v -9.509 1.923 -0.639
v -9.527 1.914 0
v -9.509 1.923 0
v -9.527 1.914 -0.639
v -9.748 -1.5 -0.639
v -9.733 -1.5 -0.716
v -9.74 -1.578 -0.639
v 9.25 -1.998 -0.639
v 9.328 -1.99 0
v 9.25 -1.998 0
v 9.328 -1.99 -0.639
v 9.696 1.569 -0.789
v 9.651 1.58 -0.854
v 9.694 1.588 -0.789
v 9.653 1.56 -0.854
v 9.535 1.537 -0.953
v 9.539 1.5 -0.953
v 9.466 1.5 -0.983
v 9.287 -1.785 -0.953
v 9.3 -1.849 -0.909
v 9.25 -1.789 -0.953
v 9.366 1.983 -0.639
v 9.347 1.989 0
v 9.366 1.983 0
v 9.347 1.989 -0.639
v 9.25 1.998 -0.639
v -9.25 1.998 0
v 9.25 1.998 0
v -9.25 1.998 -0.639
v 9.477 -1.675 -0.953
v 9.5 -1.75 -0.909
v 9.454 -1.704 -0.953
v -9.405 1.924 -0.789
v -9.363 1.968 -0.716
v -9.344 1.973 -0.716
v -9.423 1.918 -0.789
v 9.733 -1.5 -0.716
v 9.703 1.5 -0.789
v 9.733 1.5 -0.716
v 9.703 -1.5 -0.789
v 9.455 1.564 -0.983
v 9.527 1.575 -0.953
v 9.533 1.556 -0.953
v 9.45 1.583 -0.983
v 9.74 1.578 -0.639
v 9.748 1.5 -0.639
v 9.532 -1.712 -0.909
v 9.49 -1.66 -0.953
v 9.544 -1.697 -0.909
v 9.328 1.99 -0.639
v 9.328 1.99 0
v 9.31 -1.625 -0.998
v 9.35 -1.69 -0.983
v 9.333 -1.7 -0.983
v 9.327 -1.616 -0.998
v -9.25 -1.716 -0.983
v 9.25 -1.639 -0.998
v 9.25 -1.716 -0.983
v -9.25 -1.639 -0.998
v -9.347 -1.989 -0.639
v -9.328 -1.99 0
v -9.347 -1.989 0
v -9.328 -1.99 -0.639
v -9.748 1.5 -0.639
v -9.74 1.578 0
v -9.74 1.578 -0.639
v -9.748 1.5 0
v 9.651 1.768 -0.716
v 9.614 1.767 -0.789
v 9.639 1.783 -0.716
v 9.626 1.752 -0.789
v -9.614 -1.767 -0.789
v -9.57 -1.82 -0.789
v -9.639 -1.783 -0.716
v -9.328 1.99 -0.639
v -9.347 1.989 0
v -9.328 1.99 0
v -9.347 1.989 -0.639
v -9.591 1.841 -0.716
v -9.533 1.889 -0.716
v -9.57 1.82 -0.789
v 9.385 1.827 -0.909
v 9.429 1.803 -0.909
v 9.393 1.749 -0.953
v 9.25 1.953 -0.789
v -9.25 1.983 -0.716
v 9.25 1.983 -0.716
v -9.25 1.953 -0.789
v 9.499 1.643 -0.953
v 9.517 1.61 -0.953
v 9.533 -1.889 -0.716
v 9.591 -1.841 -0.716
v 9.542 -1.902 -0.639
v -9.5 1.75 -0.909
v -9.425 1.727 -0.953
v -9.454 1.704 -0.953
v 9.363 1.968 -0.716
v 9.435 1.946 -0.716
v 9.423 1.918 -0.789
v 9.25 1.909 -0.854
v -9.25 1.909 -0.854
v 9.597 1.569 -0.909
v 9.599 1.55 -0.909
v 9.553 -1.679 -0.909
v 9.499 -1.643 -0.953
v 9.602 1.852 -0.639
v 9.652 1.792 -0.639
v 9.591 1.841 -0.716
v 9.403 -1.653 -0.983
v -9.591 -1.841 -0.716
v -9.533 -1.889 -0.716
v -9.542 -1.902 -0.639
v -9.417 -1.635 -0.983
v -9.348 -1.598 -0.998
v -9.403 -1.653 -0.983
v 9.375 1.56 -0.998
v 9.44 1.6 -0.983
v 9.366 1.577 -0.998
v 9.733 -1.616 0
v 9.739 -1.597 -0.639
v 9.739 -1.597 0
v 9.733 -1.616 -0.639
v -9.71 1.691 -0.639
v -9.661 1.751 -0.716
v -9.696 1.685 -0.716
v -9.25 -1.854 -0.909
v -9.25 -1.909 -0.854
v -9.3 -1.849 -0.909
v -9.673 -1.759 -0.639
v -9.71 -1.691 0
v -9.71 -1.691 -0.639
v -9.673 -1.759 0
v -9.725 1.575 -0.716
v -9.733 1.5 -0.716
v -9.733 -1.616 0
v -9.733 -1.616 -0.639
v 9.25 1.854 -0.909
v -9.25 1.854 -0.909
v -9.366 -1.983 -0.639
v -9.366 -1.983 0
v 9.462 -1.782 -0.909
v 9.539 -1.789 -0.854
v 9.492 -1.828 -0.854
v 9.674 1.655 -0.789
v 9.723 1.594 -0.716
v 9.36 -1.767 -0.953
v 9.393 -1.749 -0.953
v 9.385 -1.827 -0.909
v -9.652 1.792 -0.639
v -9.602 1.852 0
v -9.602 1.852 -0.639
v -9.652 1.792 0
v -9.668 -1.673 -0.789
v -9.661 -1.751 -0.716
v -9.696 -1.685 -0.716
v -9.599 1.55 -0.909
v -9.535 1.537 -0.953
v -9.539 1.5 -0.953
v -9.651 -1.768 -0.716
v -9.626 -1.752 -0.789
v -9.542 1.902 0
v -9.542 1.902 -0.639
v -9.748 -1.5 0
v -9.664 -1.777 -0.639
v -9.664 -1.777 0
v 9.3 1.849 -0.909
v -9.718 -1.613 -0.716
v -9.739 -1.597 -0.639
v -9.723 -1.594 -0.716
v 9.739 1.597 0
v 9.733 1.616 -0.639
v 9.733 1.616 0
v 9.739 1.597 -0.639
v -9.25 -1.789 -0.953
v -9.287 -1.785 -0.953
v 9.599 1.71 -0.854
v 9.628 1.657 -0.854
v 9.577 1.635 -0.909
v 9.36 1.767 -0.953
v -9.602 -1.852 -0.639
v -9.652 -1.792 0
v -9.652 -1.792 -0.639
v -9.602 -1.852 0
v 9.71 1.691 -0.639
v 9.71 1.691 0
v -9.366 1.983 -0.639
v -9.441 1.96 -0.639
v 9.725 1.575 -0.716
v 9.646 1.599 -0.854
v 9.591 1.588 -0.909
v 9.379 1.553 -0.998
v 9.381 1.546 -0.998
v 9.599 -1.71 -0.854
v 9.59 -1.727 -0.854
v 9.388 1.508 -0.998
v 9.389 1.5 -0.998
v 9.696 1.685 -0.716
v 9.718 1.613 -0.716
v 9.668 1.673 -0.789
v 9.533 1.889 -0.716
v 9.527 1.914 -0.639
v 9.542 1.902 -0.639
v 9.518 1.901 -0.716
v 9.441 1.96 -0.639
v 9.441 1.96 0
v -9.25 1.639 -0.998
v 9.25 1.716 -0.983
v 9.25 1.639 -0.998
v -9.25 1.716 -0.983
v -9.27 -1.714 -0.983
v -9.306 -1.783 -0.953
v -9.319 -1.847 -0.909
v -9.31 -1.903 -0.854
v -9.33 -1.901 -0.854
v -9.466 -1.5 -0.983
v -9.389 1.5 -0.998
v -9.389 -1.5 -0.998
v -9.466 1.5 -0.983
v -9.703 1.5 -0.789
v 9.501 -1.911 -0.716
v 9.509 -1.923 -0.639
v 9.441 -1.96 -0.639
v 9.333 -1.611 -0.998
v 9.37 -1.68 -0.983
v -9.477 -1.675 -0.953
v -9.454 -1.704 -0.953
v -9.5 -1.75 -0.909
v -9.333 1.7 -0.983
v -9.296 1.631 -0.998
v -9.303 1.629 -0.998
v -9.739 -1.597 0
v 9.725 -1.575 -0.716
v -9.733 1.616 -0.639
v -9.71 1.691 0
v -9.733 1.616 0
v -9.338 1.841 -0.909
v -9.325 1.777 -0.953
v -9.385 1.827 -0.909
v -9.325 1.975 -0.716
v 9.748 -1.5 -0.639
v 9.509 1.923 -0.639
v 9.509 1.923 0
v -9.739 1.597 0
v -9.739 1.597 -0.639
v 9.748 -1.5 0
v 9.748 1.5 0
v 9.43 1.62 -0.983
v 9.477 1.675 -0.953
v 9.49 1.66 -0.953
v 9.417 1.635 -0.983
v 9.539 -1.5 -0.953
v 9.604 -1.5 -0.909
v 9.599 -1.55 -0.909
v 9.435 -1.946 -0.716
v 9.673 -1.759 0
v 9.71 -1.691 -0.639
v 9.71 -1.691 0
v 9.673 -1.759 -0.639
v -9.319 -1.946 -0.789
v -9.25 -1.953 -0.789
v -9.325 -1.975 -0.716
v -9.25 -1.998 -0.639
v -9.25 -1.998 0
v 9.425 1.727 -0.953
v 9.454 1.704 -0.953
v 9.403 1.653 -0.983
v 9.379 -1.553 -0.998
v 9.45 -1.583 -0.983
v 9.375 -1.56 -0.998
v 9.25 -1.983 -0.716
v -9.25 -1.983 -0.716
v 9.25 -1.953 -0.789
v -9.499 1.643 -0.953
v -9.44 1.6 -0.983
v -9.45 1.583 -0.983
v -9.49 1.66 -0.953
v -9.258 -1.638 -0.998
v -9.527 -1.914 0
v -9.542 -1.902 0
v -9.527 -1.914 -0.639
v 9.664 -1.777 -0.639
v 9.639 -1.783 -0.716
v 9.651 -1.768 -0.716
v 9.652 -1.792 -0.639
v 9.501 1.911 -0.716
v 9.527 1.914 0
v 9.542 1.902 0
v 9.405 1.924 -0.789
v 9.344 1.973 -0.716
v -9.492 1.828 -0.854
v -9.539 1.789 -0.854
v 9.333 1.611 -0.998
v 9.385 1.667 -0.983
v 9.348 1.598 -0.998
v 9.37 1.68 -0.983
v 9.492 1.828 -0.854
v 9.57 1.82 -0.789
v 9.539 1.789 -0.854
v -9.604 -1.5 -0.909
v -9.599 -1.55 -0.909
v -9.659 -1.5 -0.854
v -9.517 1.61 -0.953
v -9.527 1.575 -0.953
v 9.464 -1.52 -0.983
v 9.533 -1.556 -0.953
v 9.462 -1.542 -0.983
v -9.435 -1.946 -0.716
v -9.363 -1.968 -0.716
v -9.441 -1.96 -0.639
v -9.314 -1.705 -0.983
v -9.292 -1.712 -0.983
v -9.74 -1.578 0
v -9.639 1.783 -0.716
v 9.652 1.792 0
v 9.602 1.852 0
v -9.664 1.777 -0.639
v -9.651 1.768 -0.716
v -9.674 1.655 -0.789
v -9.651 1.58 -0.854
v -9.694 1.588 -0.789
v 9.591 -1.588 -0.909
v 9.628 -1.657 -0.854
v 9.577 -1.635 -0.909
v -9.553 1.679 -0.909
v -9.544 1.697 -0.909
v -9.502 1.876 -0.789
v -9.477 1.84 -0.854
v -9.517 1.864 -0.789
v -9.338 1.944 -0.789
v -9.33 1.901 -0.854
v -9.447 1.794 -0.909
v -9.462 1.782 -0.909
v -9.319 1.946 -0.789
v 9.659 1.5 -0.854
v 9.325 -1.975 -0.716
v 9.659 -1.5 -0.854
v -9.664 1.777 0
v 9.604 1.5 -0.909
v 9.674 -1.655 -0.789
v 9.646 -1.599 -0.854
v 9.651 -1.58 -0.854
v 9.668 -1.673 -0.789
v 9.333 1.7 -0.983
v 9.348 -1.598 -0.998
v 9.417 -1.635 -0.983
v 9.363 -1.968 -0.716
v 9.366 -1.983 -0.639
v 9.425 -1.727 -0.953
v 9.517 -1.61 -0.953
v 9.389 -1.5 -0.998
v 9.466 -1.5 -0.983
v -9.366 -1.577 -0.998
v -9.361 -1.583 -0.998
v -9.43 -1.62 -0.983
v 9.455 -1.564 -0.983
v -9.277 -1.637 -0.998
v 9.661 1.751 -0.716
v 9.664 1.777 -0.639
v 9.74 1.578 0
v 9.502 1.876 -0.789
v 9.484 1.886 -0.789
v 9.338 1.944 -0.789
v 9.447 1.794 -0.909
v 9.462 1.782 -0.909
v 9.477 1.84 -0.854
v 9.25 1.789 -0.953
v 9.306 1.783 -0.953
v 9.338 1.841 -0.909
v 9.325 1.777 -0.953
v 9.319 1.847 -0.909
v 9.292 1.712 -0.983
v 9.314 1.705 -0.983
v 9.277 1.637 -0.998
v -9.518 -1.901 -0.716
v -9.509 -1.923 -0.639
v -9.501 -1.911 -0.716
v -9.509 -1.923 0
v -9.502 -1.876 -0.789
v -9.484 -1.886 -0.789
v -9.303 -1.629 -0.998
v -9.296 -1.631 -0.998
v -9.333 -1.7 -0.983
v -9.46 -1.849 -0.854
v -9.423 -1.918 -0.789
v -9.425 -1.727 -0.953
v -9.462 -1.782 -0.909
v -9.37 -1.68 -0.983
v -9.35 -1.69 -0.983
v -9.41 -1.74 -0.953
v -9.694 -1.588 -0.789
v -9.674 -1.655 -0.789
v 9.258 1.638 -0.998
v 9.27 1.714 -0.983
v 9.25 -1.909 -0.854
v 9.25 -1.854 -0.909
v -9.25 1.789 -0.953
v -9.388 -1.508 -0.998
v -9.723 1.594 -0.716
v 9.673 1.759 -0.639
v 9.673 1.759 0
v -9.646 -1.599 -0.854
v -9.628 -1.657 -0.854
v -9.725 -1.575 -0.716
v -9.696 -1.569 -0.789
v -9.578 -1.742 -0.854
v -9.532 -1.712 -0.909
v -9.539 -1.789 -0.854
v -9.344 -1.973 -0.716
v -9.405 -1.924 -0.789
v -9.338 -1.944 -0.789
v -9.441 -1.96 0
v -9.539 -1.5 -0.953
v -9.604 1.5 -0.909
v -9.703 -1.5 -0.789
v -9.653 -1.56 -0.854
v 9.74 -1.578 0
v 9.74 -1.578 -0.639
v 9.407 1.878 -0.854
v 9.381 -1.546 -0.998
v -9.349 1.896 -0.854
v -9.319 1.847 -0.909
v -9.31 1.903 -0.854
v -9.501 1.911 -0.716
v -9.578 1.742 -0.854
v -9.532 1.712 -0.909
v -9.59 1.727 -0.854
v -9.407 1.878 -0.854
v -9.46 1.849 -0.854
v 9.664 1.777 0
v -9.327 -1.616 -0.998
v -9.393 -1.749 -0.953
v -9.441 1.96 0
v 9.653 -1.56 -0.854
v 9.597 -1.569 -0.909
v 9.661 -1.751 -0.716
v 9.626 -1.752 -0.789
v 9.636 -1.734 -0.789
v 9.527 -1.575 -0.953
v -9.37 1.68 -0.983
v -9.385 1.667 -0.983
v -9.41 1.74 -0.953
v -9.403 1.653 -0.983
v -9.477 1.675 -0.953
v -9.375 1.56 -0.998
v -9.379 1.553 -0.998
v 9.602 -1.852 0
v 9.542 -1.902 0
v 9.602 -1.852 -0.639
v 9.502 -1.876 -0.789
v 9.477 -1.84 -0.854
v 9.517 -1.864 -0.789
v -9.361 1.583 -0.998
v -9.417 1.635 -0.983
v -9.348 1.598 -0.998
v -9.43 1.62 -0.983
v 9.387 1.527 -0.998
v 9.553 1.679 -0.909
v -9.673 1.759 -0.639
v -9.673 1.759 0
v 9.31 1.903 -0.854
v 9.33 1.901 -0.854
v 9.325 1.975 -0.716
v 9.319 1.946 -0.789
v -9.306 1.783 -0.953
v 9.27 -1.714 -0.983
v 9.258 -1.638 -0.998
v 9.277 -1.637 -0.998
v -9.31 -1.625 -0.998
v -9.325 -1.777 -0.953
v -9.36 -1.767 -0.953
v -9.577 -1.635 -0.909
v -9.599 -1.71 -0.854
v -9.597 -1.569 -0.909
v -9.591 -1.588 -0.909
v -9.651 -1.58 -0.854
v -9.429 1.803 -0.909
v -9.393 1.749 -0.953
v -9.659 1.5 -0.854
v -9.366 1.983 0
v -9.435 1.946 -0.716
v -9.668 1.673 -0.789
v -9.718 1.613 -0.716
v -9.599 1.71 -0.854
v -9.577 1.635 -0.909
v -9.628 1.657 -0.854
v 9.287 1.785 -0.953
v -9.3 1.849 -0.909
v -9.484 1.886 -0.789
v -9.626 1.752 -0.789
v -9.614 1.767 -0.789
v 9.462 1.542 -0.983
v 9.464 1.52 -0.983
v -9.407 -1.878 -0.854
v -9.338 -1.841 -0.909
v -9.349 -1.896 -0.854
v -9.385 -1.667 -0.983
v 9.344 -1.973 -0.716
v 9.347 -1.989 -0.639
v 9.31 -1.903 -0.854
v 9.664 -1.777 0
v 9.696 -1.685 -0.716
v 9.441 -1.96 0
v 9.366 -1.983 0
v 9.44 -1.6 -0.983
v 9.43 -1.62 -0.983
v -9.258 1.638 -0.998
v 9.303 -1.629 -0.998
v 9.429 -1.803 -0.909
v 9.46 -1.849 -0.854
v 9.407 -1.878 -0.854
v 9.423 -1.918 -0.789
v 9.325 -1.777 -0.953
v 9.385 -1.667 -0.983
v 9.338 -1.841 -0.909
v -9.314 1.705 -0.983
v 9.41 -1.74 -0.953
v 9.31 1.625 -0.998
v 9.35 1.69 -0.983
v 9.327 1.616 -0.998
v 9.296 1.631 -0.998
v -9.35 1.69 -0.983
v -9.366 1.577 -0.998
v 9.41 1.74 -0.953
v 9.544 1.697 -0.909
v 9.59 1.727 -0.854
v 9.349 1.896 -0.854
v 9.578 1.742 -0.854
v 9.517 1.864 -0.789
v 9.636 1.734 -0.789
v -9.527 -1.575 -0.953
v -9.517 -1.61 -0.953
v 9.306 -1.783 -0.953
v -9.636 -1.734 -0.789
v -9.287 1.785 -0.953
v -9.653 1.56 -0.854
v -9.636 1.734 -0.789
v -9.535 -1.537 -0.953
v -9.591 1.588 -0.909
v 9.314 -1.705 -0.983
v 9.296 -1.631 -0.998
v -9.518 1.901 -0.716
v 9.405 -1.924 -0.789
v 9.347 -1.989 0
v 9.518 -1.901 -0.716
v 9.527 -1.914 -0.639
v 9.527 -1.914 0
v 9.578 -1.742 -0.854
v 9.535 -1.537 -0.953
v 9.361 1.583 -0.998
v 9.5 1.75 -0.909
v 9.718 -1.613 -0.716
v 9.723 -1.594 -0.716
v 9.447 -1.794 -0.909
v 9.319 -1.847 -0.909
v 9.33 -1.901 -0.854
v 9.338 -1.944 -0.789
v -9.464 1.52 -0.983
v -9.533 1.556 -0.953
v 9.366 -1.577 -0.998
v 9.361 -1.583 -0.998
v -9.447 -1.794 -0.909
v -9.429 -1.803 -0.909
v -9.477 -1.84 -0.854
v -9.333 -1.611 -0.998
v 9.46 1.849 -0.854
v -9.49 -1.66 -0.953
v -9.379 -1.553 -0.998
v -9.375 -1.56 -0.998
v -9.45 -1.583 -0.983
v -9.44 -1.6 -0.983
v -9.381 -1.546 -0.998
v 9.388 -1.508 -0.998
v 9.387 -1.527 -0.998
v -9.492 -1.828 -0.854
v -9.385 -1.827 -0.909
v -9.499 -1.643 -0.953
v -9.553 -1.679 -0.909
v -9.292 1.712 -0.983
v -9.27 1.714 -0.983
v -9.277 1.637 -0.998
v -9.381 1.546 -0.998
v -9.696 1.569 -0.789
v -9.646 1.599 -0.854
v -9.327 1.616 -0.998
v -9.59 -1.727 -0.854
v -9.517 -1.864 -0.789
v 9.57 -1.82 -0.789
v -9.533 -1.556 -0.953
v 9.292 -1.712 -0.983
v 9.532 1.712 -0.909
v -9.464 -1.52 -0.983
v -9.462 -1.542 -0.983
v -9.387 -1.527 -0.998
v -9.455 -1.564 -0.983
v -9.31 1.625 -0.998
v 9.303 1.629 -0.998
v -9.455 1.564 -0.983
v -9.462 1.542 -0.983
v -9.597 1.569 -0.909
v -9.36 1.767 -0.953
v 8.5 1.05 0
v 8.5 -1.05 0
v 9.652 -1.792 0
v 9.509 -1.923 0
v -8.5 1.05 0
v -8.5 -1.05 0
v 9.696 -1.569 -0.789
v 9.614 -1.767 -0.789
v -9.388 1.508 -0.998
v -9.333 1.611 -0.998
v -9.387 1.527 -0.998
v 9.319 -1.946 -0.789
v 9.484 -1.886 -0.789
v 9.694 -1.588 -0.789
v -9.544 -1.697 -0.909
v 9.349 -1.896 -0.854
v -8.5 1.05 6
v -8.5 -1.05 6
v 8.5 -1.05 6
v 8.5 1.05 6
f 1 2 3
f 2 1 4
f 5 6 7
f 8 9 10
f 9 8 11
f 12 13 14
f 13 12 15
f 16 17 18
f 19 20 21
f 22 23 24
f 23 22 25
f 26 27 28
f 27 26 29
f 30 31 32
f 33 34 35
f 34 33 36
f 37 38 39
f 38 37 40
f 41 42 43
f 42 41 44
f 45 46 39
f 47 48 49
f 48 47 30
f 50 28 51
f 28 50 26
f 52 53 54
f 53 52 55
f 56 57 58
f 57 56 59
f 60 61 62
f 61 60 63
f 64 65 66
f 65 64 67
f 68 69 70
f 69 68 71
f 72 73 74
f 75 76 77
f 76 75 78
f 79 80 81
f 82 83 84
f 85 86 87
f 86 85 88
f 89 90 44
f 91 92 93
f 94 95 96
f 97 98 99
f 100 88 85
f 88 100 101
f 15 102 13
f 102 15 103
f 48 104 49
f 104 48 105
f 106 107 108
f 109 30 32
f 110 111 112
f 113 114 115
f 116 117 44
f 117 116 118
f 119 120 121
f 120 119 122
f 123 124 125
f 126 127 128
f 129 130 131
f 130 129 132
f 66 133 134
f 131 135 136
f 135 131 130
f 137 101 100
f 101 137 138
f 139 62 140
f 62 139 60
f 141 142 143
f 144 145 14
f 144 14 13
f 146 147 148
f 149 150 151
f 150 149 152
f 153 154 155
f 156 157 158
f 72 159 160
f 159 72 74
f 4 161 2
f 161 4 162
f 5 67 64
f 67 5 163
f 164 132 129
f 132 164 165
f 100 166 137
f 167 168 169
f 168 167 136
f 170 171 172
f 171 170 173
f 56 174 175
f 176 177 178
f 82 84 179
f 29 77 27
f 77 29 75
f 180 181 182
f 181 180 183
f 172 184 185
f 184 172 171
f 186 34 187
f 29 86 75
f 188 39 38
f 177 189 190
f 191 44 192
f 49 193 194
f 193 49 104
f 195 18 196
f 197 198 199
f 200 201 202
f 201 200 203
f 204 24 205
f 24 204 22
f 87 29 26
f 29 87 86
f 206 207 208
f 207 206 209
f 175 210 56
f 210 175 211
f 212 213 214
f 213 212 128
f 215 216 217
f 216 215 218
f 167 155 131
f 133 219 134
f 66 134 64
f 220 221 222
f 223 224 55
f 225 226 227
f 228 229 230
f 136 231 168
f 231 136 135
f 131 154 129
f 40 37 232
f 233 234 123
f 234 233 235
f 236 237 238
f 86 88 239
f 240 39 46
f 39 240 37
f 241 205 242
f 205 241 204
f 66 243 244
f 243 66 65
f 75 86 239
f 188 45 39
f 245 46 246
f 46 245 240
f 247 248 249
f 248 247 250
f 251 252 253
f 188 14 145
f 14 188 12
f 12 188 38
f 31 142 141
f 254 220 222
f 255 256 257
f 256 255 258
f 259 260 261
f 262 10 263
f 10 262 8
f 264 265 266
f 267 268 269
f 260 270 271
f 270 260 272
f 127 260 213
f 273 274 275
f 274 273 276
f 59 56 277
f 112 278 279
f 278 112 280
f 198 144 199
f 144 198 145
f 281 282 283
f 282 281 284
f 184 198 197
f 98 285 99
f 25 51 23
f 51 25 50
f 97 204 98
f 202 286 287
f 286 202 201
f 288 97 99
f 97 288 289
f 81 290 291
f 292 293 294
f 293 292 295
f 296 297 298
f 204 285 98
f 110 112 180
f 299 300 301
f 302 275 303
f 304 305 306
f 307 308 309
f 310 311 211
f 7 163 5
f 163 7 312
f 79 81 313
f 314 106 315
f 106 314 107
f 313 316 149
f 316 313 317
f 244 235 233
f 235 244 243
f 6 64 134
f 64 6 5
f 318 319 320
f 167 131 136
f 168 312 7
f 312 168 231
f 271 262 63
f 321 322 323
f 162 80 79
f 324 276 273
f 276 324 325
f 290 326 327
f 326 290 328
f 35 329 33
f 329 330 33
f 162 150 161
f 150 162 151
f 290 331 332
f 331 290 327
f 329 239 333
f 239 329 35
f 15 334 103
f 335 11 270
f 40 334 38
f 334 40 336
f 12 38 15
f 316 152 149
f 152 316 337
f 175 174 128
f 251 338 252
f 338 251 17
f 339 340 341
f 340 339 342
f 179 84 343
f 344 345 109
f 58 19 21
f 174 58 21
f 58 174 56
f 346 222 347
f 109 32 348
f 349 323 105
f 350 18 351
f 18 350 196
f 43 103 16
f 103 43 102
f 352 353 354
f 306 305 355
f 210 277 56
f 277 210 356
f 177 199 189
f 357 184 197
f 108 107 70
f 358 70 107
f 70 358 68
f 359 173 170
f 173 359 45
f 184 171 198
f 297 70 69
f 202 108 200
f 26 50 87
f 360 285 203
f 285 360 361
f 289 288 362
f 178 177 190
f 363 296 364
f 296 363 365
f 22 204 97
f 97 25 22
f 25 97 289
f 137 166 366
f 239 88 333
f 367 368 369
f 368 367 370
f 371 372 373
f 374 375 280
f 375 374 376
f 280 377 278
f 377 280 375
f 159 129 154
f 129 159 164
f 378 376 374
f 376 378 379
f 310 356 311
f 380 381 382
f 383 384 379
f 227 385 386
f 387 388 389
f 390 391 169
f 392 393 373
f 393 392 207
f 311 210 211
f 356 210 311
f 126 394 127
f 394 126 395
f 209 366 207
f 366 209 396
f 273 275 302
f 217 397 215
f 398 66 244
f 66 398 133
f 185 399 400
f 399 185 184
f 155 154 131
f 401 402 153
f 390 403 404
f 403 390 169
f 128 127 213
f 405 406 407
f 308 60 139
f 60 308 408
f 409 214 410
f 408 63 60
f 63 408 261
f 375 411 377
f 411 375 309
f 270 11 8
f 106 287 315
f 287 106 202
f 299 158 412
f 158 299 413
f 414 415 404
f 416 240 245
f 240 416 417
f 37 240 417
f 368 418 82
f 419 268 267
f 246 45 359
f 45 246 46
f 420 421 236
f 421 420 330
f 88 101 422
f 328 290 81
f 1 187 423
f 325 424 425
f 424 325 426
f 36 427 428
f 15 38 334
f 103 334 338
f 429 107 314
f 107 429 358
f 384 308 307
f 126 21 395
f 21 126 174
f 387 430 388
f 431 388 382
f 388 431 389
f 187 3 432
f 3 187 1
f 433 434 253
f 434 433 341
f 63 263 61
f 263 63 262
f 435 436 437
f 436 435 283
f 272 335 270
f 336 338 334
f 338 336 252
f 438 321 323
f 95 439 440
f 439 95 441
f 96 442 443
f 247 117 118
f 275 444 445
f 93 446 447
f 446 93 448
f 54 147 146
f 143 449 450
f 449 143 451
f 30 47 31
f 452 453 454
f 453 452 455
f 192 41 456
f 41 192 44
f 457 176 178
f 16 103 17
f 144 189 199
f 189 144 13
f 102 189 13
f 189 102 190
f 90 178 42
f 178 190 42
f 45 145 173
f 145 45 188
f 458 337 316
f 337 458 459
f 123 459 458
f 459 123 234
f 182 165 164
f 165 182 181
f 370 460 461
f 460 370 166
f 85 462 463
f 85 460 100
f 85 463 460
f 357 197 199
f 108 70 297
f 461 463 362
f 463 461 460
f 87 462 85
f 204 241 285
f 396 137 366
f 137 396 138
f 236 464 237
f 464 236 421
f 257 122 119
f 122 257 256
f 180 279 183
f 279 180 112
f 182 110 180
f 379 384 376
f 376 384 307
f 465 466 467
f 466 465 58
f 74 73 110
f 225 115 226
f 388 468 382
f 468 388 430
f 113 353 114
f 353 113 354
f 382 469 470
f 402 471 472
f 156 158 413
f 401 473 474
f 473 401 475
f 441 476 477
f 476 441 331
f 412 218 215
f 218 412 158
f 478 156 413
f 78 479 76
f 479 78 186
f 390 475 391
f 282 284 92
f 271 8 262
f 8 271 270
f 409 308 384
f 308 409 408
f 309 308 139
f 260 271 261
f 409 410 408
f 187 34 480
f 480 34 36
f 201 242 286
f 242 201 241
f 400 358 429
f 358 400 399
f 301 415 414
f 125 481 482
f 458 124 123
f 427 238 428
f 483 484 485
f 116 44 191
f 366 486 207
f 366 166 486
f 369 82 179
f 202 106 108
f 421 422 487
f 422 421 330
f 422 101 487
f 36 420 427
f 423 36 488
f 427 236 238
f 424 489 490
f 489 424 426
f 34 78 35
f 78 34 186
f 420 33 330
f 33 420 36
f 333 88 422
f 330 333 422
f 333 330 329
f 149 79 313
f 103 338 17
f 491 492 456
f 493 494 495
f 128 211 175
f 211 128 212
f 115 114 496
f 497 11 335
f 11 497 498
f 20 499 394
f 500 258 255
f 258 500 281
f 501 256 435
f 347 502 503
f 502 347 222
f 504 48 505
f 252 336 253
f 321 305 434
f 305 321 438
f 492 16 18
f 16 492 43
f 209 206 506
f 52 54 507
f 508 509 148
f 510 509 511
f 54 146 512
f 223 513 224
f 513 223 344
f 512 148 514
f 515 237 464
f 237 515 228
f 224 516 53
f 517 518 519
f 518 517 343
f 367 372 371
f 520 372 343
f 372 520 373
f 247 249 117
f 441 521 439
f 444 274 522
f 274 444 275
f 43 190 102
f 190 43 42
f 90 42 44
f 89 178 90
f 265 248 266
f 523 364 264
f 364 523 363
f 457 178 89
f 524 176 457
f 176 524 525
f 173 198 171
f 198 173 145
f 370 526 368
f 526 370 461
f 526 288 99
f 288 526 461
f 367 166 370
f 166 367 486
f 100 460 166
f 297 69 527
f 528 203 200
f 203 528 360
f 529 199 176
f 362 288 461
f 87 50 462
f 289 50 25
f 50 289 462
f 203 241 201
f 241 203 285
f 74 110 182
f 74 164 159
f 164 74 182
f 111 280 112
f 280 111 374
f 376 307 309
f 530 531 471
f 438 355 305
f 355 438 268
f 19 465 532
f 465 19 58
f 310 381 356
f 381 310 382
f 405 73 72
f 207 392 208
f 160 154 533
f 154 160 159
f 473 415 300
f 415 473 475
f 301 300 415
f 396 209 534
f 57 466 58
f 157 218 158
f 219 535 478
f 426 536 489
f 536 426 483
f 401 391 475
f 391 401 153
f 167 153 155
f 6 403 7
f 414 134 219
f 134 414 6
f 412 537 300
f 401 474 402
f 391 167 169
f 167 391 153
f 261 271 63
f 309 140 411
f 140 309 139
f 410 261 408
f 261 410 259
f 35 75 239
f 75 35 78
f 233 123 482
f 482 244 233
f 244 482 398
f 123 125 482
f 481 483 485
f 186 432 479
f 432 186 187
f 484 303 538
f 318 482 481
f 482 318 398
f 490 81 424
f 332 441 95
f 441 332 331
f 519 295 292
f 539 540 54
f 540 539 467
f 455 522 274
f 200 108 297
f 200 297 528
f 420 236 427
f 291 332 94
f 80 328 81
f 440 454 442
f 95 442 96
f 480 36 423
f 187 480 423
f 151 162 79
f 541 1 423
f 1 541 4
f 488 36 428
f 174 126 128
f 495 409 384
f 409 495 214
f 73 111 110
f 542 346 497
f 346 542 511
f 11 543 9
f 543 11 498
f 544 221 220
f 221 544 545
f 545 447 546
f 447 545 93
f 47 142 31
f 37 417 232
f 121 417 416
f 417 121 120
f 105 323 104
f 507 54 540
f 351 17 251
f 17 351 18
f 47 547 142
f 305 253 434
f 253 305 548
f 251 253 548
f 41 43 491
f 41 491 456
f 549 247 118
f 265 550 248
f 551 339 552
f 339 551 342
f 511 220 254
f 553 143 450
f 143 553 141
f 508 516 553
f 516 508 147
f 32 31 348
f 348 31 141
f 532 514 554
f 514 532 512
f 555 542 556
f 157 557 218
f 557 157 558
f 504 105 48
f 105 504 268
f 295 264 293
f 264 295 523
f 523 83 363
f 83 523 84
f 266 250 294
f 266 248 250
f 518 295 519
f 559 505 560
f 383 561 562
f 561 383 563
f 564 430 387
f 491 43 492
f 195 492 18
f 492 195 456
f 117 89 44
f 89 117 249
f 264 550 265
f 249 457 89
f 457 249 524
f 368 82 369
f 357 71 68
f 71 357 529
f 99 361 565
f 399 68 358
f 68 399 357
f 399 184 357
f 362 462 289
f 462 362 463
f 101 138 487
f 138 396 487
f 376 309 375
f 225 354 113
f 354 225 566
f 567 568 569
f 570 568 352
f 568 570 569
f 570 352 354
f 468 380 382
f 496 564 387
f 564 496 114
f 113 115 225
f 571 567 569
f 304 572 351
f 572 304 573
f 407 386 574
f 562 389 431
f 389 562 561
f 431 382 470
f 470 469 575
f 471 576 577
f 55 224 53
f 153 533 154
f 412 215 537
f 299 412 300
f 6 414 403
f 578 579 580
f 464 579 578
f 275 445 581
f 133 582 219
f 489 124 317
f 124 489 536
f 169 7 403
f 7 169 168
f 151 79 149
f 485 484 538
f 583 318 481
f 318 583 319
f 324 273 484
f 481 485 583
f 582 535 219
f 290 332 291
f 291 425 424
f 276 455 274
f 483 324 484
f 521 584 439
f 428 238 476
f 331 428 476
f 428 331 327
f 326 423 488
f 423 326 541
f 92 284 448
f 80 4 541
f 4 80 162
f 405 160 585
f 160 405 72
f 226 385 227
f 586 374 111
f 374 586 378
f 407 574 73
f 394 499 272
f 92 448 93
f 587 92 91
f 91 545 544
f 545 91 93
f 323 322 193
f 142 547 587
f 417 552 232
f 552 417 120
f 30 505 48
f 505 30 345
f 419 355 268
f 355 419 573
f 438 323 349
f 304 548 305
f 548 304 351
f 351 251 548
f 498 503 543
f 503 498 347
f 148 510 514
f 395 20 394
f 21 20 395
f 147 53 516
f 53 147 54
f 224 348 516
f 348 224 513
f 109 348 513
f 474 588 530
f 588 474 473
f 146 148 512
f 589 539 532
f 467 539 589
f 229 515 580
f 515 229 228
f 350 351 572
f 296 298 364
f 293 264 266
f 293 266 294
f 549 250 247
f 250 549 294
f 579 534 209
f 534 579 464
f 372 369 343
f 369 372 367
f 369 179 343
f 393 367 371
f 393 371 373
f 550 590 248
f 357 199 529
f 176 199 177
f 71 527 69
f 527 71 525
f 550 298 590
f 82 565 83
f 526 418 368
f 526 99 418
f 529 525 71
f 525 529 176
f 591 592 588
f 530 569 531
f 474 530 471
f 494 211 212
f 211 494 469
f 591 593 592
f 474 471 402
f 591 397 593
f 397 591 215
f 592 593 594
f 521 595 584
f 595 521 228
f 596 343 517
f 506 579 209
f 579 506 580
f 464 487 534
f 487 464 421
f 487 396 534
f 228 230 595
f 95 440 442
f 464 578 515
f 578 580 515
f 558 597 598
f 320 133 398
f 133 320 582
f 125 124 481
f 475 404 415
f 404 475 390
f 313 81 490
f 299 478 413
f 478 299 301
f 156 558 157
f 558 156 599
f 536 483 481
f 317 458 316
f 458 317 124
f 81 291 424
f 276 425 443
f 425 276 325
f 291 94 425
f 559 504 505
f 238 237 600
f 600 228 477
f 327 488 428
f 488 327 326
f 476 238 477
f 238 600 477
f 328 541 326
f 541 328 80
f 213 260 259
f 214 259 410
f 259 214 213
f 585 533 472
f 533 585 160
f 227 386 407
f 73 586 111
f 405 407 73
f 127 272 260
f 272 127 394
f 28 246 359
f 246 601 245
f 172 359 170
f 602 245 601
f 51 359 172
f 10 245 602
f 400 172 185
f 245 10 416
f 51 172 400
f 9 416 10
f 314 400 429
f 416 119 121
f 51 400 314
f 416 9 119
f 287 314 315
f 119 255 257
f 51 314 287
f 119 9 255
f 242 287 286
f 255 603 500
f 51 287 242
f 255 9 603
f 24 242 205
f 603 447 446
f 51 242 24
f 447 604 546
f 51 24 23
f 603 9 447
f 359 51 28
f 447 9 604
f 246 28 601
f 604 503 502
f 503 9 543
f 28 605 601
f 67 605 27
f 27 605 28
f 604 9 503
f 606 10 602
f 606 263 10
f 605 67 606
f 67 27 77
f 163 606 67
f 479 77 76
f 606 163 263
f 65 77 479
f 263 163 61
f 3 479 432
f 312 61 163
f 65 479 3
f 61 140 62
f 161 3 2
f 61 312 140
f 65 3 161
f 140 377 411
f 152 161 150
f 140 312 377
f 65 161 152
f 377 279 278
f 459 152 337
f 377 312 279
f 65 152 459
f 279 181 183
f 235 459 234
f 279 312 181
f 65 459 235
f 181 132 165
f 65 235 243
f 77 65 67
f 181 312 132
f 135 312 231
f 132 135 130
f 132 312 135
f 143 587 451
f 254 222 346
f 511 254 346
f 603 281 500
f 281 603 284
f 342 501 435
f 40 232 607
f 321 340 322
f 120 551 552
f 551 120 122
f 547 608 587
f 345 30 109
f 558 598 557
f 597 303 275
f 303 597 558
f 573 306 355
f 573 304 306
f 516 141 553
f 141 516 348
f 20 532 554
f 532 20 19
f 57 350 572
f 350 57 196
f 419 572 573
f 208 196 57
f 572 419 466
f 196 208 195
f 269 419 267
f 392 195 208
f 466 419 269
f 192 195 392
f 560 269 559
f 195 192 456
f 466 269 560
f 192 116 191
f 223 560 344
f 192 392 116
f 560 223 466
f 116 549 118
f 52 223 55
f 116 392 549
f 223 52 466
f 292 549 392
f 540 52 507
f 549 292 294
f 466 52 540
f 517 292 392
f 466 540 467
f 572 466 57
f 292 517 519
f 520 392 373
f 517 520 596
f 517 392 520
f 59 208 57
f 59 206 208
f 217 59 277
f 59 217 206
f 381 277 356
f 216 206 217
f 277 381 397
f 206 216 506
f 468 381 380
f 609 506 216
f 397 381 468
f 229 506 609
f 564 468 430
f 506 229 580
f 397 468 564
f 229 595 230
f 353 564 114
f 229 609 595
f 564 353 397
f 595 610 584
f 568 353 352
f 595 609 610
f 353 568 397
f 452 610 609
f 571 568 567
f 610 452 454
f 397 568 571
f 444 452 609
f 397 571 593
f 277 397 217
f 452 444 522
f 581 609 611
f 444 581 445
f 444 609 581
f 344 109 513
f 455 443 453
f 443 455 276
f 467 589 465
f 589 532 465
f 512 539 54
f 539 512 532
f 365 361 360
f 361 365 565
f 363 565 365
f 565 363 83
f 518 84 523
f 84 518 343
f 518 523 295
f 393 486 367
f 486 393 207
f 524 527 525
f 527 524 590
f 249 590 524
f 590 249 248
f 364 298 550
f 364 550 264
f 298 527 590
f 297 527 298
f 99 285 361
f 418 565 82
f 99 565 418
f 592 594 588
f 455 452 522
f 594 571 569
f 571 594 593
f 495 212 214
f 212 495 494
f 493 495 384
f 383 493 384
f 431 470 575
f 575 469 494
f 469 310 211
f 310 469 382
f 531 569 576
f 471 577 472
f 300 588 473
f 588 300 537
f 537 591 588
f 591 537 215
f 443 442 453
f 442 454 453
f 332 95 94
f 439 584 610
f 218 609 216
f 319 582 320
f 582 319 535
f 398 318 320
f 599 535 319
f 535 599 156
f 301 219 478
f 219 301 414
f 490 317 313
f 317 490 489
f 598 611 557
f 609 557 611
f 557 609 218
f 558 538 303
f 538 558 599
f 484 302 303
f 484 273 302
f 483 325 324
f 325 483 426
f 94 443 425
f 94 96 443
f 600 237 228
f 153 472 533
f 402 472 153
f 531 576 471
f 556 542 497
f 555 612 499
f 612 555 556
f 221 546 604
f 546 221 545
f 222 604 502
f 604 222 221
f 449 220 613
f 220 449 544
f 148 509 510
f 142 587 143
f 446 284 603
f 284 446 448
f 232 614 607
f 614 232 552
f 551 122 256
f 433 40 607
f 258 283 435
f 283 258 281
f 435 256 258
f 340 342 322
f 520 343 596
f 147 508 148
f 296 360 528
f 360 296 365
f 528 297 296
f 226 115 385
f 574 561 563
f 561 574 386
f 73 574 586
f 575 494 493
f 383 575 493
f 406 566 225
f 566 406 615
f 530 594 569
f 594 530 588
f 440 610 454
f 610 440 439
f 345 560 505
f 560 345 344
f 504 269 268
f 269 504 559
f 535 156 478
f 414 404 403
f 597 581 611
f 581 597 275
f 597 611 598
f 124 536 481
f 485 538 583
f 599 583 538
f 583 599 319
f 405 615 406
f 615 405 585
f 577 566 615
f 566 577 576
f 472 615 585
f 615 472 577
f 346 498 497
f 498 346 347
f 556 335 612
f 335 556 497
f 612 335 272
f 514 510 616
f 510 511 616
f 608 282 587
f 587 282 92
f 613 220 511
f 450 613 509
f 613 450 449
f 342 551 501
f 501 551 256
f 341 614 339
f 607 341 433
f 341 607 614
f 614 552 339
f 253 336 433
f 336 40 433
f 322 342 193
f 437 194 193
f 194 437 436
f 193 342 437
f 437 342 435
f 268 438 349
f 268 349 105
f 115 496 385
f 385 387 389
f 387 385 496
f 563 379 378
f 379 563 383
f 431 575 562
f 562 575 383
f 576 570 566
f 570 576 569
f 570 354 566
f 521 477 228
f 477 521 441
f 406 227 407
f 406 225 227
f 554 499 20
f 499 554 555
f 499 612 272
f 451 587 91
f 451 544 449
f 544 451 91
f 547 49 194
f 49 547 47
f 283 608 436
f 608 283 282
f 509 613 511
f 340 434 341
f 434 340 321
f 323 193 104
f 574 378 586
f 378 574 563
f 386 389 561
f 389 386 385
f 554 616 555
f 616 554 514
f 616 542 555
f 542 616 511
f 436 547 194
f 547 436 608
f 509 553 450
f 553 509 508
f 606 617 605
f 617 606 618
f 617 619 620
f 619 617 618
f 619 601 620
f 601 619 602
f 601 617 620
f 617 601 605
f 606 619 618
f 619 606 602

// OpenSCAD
// US General Series 2 Toolbox - Track End Cap
// Caps the sharp end of a label track to prevent injury.
// The wedge inserts into the track channel to retain the cap.

/* [Cap Body] */

// Length of the cap (mm).
capLength = 19.5; // [19:0.25:22]

// Width of the cap (mm).
capWidth = 4; // [4:0.25:6]

// Thickness of the cap body (mm).
capThick = 1; // [1:0.2:4]

// Radius of the rounded corners (mm).
cornerRadius = 0.5; // [0:0.1:1]

// Radius used to round the perimeter edges of the face (mm).
faceRadius = 0.4; // [0:0.1:1]

/* [Wedge] */

// Maximum height of the wedge (mm).
wedgeHeight = 17; // [16:0.1:18]

// Width of the retaining wedge (mm).
wedgeWidth = 2.1; // [1.5:0.1:2.4]

// Length of the retaining wedge (mm).
wedgeLength = 6; // [2:1:10]

/* [Hidden] */

$fn = 32;

// ── Modules ──────────────────────────────────────────────────────────────────

module roundedRect2D(length, width, radius) {
    hull() {
        translate([ length/2 - radius,  width/2 - radius]) circle(r=radius);
        translate([-length/2 + radius,  width/2 - radius]) circle(r=radius);
        translate([ length/2 - radius, -width/2 + radius]) circle(r=radius);
        translate([-length/2 + radius, -width/2 + radius]) circle(r=radius);
    }
}

// Cap body: flat on the wedge side (Z=0), rounded edges on the face (Z=capThick).
// A top-half sphere in the minkowski sum only rounds the upper perimeter edges.
module capBody() {
    minkowski() {
        linear_extrude(height = capThick - faceRadius)
            roundedRect2D(
                capLength - faceRadius * 2,
                capWidth  - faceRadius * 2,
                max(cornerRadius - faceRadius, 0.01)
            );
        // Half-sphere (positive-Z hemisphere only) — leaves the bottom face flat.
        intersection() {
            sphere(r = faceRadius);
            translate([0, 0, faceRadius / 2])
                cube([faceRadius * 4, faceRadius * 4, faceRadius], center = true);
        }
    }
}

// Rectangular prism extending downward from Z = 0.
module wedge() {
    translate([0, 0, -wedgeLength/2])
        cube([wedgeHeight, wedgeWidth, wedgeLength], center=true);
}

// ── Assembly ──────────────────────────────────────────────────────────────────

rotate([0, 180, 0])
union() {
    capBody();
    wedge();
}
